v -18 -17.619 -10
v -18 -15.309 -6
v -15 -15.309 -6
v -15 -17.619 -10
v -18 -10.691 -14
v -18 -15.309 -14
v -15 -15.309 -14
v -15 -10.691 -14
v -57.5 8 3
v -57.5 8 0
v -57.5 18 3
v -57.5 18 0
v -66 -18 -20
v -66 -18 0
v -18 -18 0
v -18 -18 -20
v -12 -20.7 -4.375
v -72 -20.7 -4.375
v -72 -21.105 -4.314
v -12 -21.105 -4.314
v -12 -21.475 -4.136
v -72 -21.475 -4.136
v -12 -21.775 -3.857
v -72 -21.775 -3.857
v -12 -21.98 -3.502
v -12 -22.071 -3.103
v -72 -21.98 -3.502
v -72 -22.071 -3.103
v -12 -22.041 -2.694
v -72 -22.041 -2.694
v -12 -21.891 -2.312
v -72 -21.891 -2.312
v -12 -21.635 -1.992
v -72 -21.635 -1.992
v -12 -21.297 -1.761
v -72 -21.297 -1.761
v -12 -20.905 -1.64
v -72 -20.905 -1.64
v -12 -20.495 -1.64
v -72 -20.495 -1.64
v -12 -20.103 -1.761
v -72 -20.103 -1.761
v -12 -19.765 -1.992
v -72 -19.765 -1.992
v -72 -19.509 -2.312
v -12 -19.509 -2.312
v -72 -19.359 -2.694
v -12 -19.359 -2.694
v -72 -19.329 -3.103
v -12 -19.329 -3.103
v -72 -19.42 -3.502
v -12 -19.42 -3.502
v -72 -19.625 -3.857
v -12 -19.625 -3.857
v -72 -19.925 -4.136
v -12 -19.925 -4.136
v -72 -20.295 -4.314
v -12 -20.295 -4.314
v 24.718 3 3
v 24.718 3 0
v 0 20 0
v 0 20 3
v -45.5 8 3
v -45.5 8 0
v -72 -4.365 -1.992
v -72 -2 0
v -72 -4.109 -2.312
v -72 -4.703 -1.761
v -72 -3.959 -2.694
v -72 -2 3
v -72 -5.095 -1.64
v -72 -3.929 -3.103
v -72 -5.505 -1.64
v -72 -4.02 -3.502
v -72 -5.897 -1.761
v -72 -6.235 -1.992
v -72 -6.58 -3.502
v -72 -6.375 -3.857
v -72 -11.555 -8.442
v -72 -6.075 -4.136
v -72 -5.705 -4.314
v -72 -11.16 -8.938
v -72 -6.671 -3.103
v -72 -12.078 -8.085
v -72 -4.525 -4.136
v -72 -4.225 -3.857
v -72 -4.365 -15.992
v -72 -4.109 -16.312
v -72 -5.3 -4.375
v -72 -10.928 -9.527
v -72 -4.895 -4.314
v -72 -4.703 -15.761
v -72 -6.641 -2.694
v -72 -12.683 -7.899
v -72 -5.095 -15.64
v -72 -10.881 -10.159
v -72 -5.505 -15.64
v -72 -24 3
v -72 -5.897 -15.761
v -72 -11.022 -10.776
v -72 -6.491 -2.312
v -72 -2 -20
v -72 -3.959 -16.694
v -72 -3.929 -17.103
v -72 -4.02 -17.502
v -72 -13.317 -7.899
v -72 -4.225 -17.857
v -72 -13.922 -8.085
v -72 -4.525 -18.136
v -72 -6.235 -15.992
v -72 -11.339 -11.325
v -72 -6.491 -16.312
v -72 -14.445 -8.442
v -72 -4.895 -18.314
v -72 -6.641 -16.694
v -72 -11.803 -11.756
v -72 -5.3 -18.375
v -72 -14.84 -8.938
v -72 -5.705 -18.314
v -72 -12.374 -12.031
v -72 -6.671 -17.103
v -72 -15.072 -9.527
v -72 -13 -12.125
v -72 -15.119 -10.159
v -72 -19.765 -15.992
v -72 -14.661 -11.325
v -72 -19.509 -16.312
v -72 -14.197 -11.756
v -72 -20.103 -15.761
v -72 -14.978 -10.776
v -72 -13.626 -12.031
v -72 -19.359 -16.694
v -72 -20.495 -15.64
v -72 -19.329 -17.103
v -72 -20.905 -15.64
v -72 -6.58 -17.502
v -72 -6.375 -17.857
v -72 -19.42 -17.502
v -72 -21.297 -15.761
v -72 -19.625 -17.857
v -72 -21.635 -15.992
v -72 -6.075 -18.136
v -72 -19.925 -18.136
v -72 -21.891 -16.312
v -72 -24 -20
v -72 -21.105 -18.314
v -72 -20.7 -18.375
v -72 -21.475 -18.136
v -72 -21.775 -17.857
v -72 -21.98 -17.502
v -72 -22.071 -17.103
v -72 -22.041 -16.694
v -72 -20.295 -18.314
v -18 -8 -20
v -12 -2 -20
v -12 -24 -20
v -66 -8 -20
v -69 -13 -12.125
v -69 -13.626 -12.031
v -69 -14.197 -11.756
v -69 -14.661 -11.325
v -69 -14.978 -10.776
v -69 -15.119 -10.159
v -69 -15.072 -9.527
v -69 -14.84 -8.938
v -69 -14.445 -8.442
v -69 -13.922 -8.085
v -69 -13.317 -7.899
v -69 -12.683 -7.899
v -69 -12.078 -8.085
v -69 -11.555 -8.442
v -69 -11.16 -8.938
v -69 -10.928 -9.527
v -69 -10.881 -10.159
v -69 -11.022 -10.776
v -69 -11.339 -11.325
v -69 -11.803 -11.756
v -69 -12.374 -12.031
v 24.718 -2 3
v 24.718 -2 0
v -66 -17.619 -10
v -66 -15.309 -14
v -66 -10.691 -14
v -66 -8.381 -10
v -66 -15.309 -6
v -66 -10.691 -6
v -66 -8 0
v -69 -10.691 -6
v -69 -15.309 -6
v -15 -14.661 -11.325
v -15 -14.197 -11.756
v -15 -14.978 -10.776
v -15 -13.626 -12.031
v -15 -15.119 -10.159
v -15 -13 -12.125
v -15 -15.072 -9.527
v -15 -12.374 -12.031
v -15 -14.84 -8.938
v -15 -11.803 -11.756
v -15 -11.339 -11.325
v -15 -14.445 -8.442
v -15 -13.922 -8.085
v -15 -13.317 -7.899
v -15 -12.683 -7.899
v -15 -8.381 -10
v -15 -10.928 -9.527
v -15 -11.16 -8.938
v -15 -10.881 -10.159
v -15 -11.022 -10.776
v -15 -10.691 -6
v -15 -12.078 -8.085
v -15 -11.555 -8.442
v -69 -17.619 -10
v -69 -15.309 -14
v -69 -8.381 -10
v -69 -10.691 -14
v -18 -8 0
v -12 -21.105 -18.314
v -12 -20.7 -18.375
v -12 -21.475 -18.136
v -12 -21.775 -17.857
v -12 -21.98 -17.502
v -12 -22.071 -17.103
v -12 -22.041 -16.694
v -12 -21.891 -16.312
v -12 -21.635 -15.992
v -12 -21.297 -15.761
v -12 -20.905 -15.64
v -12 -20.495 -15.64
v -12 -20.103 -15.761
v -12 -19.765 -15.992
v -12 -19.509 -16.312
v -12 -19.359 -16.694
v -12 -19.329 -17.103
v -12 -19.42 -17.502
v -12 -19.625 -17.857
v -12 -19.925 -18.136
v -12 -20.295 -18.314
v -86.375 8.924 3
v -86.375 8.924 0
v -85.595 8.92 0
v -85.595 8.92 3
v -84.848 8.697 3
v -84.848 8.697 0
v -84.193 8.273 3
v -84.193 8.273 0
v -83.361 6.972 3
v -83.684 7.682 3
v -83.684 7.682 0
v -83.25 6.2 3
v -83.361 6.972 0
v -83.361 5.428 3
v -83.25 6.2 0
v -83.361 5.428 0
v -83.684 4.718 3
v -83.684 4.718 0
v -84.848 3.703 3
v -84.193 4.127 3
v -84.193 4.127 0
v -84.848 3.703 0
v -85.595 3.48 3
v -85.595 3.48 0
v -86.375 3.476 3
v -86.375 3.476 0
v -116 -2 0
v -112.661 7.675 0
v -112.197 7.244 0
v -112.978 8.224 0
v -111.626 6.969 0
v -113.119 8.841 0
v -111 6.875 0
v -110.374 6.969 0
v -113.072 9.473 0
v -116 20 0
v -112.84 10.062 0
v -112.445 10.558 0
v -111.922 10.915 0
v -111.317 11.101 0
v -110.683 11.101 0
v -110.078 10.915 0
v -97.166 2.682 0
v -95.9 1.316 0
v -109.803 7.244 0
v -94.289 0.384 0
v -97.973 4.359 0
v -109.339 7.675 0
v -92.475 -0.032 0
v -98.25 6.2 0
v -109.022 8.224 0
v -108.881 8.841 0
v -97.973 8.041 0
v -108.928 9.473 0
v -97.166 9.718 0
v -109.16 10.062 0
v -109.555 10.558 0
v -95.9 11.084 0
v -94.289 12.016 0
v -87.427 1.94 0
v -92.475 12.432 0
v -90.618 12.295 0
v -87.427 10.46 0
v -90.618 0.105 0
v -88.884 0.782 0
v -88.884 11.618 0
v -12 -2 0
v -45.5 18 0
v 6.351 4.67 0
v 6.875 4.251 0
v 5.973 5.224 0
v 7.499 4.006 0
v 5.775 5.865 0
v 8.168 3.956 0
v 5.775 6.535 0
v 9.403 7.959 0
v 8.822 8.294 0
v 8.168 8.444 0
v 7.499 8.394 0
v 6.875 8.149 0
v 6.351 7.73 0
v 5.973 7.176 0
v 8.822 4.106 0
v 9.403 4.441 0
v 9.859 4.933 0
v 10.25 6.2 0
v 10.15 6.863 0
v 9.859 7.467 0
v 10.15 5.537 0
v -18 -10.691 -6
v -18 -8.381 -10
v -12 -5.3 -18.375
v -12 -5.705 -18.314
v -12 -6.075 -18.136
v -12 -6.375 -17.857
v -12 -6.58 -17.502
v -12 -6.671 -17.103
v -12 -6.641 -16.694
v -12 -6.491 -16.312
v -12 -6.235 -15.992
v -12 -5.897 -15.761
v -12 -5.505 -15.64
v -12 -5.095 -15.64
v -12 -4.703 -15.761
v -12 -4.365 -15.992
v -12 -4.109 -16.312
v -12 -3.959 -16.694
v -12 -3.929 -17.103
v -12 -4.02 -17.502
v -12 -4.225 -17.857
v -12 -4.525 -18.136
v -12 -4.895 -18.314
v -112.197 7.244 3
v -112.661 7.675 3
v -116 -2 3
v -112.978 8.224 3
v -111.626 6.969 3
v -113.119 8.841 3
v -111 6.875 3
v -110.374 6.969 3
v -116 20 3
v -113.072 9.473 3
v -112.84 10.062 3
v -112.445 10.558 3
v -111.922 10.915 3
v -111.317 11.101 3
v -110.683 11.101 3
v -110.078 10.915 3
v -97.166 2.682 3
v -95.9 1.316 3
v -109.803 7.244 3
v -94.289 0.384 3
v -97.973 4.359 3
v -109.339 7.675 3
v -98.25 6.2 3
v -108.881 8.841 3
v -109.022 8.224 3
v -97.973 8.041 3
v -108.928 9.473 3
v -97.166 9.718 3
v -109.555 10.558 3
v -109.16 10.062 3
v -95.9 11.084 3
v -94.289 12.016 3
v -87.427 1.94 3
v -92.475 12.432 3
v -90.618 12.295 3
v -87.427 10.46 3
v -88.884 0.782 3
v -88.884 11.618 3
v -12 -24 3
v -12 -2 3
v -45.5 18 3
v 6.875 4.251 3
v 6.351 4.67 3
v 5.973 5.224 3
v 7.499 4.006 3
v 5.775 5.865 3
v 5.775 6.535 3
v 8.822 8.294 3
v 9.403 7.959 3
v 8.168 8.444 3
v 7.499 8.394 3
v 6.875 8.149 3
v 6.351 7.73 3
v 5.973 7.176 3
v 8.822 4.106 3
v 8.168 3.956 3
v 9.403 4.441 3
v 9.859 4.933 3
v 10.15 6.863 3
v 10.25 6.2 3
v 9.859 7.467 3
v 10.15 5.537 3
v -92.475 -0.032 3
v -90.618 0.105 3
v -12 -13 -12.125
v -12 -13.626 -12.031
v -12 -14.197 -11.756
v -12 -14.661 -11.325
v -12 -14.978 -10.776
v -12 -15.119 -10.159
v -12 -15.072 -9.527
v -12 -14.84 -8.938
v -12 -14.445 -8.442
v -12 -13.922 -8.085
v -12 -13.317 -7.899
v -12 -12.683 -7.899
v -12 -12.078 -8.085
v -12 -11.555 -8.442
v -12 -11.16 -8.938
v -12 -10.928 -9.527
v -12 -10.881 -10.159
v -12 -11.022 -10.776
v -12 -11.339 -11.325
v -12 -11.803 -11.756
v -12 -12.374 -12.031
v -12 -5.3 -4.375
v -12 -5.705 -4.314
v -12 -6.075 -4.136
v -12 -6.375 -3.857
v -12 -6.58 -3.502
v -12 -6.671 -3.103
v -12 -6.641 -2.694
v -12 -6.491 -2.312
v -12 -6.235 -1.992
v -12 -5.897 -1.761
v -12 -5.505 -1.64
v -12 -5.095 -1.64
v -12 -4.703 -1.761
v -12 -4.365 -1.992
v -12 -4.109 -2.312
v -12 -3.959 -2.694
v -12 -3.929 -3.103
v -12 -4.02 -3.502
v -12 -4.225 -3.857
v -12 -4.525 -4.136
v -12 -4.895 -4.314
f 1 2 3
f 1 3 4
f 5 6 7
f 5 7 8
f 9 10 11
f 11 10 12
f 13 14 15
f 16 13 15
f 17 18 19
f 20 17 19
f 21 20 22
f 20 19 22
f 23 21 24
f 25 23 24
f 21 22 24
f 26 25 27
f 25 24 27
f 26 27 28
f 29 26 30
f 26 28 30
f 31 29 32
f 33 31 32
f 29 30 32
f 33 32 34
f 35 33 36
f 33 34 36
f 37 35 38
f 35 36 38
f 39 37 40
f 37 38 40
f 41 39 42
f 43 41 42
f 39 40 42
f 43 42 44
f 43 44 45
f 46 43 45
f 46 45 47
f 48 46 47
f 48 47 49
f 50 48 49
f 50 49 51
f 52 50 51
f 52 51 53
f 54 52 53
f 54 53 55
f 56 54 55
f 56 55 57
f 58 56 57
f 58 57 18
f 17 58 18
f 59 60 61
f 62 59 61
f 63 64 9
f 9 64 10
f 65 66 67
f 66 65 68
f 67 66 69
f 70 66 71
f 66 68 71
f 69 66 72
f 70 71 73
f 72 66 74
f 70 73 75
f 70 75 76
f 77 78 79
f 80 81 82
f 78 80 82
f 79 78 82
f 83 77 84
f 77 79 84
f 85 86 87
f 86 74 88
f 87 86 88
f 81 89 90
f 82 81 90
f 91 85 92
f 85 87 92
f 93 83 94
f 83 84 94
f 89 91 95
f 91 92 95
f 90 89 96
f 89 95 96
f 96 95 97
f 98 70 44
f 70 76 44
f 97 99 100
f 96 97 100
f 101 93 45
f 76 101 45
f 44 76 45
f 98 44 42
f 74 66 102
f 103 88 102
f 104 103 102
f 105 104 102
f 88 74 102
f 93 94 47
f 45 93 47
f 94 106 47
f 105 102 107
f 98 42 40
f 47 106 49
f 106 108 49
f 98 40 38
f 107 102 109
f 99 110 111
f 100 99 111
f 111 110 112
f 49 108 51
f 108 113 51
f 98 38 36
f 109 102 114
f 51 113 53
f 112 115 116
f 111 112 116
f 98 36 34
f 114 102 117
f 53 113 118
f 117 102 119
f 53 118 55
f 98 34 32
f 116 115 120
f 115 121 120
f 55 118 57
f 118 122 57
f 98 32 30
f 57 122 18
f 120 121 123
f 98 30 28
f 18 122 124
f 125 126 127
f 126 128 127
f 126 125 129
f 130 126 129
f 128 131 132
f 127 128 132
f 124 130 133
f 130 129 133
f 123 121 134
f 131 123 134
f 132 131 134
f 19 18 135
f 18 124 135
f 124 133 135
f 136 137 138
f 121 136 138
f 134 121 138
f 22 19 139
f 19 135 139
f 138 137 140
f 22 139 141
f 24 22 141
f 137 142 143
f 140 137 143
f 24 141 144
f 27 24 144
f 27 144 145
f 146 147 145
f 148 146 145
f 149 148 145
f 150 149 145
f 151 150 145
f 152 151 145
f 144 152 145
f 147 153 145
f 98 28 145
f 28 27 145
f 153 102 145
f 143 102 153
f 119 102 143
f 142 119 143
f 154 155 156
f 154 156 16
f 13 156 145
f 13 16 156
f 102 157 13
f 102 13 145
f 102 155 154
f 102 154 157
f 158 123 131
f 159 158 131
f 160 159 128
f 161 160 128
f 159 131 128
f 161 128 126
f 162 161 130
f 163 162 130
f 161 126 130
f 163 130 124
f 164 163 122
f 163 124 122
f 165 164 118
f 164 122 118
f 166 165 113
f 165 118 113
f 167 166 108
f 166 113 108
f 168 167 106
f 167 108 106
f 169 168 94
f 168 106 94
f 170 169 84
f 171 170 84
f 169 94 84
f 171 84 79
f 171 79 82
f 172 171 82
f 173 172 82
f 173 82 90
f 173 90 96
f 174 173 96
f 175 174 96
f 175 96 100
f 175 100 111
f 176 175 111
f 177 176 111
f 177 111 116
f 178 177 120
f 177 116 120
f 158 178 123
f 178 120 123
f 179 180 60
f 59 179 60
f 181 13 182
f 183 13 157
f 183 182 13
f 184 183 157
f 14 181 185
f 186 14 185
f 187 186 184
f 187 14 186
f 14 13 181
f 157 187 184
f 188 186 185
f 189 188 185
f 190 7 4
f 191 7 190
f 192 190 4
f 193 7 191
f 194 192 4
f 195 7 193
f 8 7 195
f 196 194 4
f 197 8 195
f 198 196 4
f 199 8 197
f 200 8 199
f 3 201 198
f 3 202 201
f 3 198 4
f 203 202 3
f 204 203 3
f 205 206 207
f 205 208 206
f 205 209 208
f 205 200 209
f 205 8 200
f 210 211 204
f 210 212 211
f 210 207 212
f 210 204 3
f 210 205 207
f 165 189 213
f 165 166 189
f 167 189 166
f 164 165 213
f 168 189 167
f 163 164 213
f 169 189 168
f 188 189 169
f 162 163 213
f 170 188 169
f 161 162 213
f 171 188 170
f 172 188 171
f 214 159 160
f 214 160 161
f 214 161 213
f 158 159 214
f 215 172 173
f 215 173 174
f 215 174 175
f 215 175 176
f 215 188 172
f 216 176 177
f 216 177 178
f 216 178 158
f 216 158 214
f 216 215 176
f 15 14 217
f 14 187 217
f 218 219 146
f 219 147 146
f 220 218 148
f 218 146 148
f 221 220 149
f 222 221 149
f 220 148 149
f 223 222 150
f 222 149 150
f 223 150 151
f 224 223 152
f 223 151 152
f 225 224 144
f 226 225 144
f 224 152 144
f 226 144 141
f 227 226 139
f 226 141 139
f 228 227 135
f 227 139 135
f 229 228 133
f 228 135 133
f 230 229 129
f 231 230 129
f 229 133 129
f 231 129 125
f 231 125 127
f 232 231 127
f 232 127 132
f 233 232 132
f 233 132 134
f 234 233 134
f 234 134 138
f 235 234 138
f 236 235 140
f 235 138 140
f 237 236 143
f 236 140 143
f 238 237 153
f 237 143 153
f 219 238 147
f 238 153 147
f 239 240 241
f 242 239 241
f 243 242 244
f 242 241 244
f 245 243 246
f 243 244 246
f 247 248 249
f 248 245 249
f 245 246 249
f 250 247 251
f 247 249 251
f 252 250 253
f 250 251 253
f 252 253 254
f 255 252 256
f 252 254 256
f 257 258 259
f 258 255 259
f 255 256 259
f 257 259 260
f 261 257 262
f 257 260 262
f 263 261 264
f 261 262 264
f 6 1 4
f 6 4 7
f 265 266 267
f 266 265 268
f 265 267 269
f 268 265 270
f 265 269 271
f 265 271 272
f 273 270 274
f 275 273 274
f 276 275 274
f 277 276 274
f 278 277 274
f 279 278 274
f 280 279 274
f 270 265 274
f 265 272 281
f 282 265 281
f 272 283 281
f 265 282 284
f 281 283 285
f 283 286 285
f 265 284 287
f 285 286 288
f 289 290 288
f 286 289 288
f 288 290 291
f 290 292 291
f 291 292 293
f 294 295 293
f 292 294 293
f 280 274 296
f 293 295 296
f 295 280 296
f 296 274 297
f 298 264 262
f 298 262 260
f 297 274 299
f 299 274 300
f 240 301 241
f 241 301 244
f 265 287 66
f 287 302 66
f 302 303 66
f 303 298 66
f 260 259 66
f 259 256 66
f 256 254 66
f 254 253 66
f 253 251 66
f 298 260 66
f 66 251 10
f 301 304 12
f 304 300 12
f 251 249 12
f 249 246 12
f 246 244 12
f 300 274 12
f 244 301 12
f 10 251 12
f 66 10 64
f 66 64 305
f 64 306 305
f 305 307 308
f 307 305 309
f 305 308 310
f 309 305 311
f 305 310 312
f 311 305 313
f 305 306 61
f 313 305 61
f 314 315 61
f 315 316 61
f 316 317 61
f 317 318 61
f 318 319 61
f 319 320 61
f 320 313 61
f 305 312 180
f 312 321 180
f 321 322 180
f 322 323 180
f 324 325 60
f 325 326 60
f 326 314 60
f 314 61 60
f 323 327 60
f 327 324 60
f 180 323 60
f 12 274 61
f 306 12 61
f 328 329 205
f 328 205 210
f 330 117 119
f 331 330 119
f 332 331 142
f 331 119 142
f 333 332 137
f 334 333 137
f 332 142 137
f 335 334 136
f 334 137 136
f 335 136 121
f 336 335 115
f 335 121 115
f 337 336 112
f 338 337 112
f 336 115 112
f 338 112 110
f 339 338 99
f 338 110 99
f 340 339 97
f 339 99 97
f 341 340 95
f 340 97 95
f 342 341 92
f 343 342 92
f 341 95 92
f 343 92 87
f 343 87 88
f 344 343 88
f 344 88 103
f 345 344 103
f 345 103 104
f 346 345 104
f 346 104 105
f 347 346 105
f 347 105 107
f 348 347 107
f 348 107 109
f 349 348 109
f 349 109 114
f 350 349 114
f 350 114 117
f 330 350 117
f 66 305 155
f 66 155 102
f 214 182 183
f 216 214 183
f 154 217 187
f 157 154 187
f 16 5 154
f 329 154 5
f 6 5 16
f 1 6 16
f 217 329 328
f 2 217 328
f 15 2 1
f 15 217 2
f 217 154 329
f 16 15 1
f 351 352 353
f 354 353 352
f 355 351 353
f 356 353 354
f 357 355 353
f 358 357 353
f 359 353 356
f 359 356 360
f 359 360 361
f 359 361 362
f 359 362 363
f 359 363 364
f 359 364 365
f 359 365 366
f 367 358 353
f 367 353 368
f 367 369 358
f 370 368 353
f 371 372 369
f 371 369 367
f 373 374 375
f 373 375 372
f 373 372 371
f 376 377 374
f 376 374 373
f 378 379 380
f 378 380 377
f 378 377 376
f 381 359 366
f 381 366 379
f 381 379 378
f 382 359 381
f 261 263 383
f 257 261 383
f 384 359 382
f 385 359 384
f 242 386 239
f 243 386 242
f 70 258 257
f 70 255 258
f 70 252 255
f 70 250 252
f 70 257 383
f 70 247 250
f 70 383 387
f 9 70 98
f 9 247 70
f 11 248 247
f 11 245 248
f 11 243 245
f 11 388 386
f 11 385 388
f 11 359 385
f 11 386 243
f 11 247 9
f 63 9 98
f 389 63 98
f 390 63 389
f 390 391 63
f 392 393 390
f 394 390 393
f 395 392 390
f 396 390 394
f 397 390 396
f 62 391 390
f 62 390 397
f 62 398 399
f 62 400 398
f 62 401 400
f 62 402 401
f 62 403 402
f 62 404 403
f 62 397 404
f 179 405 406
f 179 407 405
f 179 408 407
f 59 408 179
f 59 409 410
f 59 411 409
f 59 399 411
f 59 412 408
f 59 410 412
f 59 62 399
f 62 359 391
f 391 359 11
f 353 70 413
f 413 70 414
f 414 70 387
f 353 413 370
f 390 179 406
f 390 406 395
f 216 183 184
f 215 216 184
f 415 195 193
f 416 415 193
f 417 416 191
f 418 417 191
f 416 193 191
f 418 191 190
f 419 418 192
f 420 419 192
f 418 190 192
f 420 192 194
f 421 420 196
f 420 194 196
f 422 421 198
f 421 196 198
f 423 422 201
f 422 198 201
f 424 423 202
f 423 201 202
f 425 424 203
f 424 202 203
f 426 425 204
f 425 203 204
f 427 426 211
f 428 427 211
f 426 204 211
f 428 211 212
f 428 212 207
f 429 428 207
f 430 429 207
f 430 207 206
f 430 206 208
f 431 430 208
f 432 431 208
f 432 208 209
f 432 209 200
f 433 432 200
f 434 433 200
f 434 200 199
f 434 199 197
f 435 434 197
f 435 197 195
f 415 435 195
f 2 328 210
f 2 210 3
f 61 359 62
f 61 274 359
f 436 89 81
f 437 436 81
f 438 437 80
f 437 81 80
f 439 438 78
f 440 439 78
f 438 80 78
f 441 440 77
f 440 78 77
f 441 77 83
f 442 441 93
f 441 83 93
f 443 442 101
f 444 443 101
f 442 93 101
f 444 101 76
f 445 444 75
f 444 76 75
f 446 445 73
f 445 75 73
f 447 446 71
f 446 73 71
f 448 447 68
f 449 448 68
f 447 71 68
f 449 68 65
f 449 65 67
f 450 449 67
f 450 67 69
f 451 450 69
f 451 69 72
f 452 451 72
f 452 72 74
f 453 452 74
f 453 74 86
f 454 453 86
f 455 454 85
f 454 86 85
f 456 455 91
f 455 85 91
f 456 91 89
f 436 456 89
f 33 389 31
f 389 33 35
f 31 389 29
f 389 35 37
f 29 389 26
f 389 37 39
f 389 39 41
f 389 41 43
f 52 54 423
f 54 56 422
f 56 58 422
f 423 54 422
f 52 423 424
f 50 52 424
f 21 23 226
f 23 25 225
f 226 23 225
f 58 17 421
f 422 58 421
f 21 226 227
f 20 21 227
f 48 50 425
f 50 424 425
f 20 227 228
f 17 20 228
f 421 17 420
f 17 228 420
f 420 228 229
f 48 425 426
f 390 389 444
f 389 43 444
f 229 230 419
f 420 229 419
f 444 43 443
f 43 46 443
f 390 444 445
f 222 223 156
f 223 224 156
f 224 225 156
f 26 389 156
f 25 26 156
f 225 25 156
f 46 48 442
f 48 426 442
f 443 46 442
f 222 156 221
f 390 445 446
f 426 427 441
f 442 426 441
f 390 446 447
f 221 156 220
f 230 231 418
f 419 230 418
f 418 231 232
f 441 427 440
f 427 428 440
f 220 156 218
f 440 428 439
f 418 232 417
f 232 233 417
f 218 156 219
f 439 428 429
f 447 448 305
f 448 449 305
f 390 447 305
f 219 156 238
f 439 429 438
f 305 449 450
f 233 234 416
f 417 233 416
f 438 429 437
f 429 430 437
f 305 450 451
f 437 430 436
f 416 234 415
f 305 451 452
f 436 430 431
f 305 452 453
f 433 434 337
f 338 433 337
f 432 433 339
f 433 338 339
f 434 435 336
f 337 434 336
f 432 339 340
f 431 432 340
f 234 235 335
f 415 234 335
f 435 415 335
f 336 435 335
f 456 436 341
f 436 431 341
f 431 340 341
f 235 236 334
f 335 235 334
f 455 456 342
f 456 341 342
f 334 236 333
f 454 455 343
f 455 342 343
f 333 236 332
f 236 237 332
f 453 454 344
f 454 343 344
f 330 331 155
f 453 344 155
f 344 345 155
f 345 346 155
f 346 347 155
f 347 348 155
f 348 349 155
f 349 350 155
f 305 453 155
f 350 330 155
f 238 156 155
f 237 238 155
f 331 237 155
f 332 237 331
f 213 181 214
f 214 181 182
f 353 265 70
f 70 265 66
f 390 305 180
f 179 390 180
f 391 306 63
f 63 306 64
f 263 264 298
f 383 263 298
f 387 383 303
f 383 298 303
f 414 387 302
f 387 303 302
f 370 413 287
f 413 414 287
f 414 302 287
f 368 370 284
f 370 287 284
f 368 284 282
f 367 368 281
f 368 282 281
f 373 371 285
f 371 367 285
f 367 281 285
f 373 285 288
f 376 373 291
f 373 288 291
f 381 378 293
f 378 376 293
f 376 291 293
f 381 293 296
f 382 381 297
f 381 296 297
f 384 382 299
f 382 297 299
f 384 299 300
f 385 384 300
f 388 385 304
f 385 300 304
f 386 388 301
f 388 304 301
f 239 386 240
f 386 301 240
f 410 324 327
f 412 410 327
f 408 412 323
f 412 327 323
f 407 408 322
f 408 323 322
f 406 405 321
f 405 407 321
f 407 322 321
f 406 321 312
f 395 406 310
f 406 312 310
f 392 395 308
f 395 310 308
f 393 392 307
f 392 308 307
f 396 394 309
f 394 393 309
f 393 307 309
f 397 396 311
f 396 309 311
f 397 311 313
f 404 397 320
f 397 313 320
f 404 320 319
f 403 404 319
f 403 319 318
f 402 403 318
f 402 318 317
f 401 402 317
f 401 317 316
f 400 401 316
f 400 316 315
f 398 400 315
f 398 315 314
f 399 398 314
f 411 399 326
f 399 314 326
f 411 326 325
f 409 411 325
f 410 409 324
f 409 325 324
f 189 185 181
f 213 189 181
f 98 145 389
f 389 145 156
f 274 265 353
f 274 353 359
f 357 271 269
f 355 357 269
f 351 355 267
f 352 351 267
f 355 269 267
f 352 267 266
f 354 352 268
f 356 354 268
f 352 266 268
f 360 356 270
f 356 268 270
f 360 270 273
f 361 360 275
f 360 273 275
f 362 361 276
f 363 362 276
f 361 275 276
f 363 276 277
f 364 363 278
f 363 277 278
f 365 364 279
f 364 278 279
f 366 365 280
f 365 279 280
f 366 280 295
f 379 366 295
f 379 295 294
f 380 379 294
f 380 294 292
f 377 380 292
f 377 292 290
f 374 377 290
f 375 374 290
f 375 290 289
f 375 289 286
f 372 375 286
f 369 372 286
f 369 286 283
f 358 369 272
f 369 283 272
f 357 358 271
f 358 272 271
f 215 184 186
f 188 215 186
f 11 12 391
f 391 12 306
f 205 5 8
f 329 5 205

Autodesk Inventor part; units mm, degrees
ref_plane "YZ Plane" through (0, 0, 0) normal (1, 0, 0) x (0, 1, 0)
ref_plane "XZ Plane" through (0, 0, 0) normal (0, 1, 0) x (-1, 0, 0)
ref_plane "XY Plane" through (0, 0, 0) normal (0, 0, 1) x (1, 0, 0)
sketch "Szkic1" plane through (0, 0, 0) normal (0, 0, 1) x (1, 0, 0)
  line L0 (-106, 20) -> (0, 20) projected
  line L1 (-106, 20) -> (-106, -2) projected
  line L2 (-106, -2) -> (24.7184, -2) projected
  line L3 (24.7184, -2) -> (24.7184, 3) projected
  line L4 (24.7184, 3) -> (0, 20) projected
  circle A0 centre (8, 6.2) radius 2 construction
  circle A1 centre (8, 6.2) radius 2.25
  line L5 (-57.5, 18) -> (-45.5, 18)
  line L6 (-45.5, 18) -> (-45.5, 8)
  line L7 (-45.5, 8) -> (-57.5, 8)
  line L8 (-57.5, 8) -> (-57.5, 18)
  line L9 (-70, 12.4) -> (-70, 0) construction
  arc A2 (-86.6773, 8.9692) -> (-86.6773, 3.4308) centre (-92, 6.2) ccw construction
  arc A3 (-86, 3.7) -> (-86, 8.7) centre (-86, 6.2) ccw construction
  arc A4 (-86.2337, 3.7) -> (-86.6773, 3.4308) centre (-86.2337, 3.2) ccw construction
  line L10 (-86.2337, 3.7) -> (-86, 3.7) construction
  arc A5 (-86.6773, 8.9692) -> (-86.2337, 8.7) centre (-86.2337, 9.2) ccw construction
  line L11 (-86, 8.7) -> (-86.2337, 8.7) construction
  arc A6 (-86.375, 8.9243) -> (-86.375, 3.4757) centre (-92, 6.2) ccw
  arc A7 (-86.375, 3.4757) -> (-86.375, 8.9243) centre (-86, 6.2) ccw
  line L12 (-116, 20) -> (-106, 20)
  line L13 (-106, 20) -> (-106, -2)
  line L14 (-106, -2) -> (-116, -2)
  line L15 (-116, -2) -> (-116, 20)
  line L16 (-92, 6.2) -> (-92, -8.9) construction
  line L17 (-92, -8.9) -> (-1, -8.9) construction
  line L18 (-72, -24) -> (-12, -24)
  line L19 (-12, -24) -> (-12, -2)
  line L20 (-12, -2) -> (-72, -2)
  line L21 (-72, -2) -> (-72, -24)
  point P0 (0, 0)
  point P1 (-7.9, -2)
  point P2 (-12, -2)
  dimension "d0" = 0.25
  dimension "d1" = 12.5
  dimension "d2" = 12
  dimension "d3" = 2
  dimension "d4" = 10
  dimension "d5" = 0.25
  dimension "d6" = 10
  dimension "d11" = 91
  dimension "d14" = 20
  dimension "d15" = 20
extrude "Wyciągnięcie proste1" add sketch "Szkic1" along normal blind 3
sketch "Szkic2" plane through (0, 0, 0) normal (0, 0, -1) x (-1, 0, 0)
  line L0 (12, -2) -> (18, -2)
  line L1 (18, -2) -> (18, -24)
  line L2 (18, -24) -> (12, -24)
  line L3 (12, -24) -> (12, -2)
  line L4 (66, -2) -> (72, -2)
  line L5 (72, -2) -> (72, -24)
  line L6 (72, -24) -> (66, -24)
  line L7 (66, -24) -> (66, -2)
  line L8 (72, -2) -> (72, -24) projected
  line L9 (12, -24) -> (12, -2) projected
  line L10 (72, -24) -> (12, -24) projected
  point P0 (0, 0)
  dimension "d16" = 6
  dimension "d17" = 6
extrude "Wyciągnięcie proste2" add sketch "Szkic2" along normal blind 20
sketch "Szkic4" plane through (-66, -24, 0) normal (1, 0, 0) x (0, 0, -1)
  line L0 (3, 18.7) -> (17, 18.7) construction
  line L1 (17, 18.7) -> (17, 3.3) construction
  line L2 (17, 3.3) -> (3, 3.3) construction
  line L3 (3, 3.3) -> (3, 18.7) construction
  line L4 (3, 18.7) -> (10, 11) construction
  line L5 (10, 11) -> (3, 3.3) construction
  line L6 (17, 3.3) -> (10, 11) construction
  line L7 (0, 22) -> (20, 22) construction
  line L8 (3, 18.7) -> (0, 22) construction
  line L9 (0, 0) -> (20, 0) construction
  line L10 (17, 3.3) -> (20, 0) construction
  line L11 (3, 3.3) -> (0, 0) construction
  line L12 (20, 22) -> (20, 0) construction
  point P0 (0, 24)
  dimension "d20" = 3
hole "Otwór2" at (-66, -13, -10) direction (-1, 0, 0) diameter 4.25 end through all both
sketch "Szkic5" plane through (-18, -24, 0) normal (-1, 0, 0) x (0, 0, 1)
  line L0 (-13.5, 11) -> (-13.5, 8.9793) projected
  line L1 (-13.5, 13.0207) -> (-13.5, 11) projected
  line L2 (-13.5, 8.9793) -> (-11.75, 7.9689) projected
  line L3 (-11.75, 7.9689) -> (-10, 6.9585) projected
  line L4 (-10, 6.9585) -> (-8.25, 7.9689) projected
  line L5 (-8.25, 7.9689) -> (-6.5, 8.9793) projected
  line L6 (-6.5, 8.9793) -> (-6.5, 11) projected
  line L7 (-6.5, 11) -> (-6.5, 13.0207) projected
  line L8 (-6.5, 13.0207) -> (-8.25, 14.0311) projected
  line L9 (-8.25, 14.0311) -> (-10, 15.0415) projected
  line L10 (-10, 15.0415) -> (-11.75, 14.0311) projected
  line L11 (-11.75, 14.0311) -> (-13.5, 13.0207) projected
  line L12 (-14, 8.6906) -> (-14, 11)
  line L13 (-14, 11) -> (-14, 13.3094)
  line L14 (-14, 13.3094) -> (-12, 14.4641)
  line L15 (-12, 14.4641) -> (-10, 15.6188)
  line L16 (-10, 15.6188) -> (-8, 14.4641)
  line L17 (-8, 14.4641) -> (-6, 13.3094)
  line L18 (-6, 13.3094) -> (-6, 11)
  line L19 (-6, 11) -> (-6, 8.6906)
  line L20 (-6, 8.6906) -> (-8, 7.5359)
  line L21 (-8, 7.5359) -> (-10, 6.3812)
  line L22 (-10, 6.3812) -> (-12, 7.5359)
  line L23 (-12, 7.5359) -> (-14, 8.6906)
  point P0 (0, 24)
  dimension "d36" = 0.5
extrude "Wyciągnięcie proste3" cut sketch "Szkic5" against normal blind 3 contours L1 L11 L10 L9 L8 L7 L6 L5 L4 L3 L2 L0 | L12 L13 L14 L15 L16 L17 L18 L19 L20 L21 L22 L23
sketch "Szkic6" plane through (-66, -24, 0) normal (1, 0, 0) x (0, 0, -1)
  line L0 (14, 8.6906) -> (14, 13.3094) projected
  line L1 (14, 13.3094) -> (10, 15.6188) projected
  line L2 (10, 15.6188) -> (6, 13.3094) projected
  line L3 (6, 13.3094) -> (6, 8.6906) projected
  line L4 (6, 8.6906) -> (10, 6.3812) projected
  line L5 (10, 6.3812) -> (14, 8.6906) projected
  point P0 (0, 24)
extrude "Wyciągnięcie proste4" cut sketch "Szkic6" against normal blind 3
sketch "Szkic7" plane through (0, 0, 3) normal (0, 0, 1) x (1, 0, 0)
  line L0 (-116, 20) -> (-116, -2) projected
  line L1 (-116, 20) -> (-106, 20) projected
  line L2 (-106, -2) -> (-116, -2) projected
  line L3 (-106, 20) -> (-106, -2) projected
  line L4 (0, 20) -> (-116, 20) construction
  line L5 (-116, 20) -> (-111, 9) construction
  line L6 (-111, 9) -> (-106, -2) construction
  line L7 (-116, -2) -> (-72, -2) construction
  line L8 (-116, -2) -> (-111, 9) construction
  point P0 (0, 0)
hole "Otwór3" at (-111, 9, 3) direction (0, 0, -1) diameter 4.25 end through all
sketch "Szkic8" plane through (0, 0, 0) normal (0, 0, -1) x (-1, 0, 0)
  line L0 (66, -18) -> (18, -18)
  line L1 (18, -18) -> (18, -24)
  line L2 (18, -24) -> (66, -24)
  line L3 (66, -24) -> (66, -18)
  line L4 (66, -2) -> (18, -2)
  line L5 (18, -2) -> (18, -8)
  line L6 (18, -8) -> (66, -8)
  line L7 (66, -8) -> (66, -2)
  line L8 (66, -24) -> (18, -24) projected
  point P0 (0, 0)
  dimension "d48" = 6
  dimension "d49" = 6
extrude "Wyciągnięcie proste5" add sketch "Szkic8" along normal blind 20
hole "Otwór1" at (-66, -5.3, -3) at (-66, -20.7, -17) at (-66, -20.7, -3) at (-66, -5.3, -17) direction (-1, 0, 0) diameter 2.75 end through all both
equation "\"d15\" = d14"
equation "\"d17\" = d16"
equation "\"d49\" = d48"
properties part number "wheel-adapter"
